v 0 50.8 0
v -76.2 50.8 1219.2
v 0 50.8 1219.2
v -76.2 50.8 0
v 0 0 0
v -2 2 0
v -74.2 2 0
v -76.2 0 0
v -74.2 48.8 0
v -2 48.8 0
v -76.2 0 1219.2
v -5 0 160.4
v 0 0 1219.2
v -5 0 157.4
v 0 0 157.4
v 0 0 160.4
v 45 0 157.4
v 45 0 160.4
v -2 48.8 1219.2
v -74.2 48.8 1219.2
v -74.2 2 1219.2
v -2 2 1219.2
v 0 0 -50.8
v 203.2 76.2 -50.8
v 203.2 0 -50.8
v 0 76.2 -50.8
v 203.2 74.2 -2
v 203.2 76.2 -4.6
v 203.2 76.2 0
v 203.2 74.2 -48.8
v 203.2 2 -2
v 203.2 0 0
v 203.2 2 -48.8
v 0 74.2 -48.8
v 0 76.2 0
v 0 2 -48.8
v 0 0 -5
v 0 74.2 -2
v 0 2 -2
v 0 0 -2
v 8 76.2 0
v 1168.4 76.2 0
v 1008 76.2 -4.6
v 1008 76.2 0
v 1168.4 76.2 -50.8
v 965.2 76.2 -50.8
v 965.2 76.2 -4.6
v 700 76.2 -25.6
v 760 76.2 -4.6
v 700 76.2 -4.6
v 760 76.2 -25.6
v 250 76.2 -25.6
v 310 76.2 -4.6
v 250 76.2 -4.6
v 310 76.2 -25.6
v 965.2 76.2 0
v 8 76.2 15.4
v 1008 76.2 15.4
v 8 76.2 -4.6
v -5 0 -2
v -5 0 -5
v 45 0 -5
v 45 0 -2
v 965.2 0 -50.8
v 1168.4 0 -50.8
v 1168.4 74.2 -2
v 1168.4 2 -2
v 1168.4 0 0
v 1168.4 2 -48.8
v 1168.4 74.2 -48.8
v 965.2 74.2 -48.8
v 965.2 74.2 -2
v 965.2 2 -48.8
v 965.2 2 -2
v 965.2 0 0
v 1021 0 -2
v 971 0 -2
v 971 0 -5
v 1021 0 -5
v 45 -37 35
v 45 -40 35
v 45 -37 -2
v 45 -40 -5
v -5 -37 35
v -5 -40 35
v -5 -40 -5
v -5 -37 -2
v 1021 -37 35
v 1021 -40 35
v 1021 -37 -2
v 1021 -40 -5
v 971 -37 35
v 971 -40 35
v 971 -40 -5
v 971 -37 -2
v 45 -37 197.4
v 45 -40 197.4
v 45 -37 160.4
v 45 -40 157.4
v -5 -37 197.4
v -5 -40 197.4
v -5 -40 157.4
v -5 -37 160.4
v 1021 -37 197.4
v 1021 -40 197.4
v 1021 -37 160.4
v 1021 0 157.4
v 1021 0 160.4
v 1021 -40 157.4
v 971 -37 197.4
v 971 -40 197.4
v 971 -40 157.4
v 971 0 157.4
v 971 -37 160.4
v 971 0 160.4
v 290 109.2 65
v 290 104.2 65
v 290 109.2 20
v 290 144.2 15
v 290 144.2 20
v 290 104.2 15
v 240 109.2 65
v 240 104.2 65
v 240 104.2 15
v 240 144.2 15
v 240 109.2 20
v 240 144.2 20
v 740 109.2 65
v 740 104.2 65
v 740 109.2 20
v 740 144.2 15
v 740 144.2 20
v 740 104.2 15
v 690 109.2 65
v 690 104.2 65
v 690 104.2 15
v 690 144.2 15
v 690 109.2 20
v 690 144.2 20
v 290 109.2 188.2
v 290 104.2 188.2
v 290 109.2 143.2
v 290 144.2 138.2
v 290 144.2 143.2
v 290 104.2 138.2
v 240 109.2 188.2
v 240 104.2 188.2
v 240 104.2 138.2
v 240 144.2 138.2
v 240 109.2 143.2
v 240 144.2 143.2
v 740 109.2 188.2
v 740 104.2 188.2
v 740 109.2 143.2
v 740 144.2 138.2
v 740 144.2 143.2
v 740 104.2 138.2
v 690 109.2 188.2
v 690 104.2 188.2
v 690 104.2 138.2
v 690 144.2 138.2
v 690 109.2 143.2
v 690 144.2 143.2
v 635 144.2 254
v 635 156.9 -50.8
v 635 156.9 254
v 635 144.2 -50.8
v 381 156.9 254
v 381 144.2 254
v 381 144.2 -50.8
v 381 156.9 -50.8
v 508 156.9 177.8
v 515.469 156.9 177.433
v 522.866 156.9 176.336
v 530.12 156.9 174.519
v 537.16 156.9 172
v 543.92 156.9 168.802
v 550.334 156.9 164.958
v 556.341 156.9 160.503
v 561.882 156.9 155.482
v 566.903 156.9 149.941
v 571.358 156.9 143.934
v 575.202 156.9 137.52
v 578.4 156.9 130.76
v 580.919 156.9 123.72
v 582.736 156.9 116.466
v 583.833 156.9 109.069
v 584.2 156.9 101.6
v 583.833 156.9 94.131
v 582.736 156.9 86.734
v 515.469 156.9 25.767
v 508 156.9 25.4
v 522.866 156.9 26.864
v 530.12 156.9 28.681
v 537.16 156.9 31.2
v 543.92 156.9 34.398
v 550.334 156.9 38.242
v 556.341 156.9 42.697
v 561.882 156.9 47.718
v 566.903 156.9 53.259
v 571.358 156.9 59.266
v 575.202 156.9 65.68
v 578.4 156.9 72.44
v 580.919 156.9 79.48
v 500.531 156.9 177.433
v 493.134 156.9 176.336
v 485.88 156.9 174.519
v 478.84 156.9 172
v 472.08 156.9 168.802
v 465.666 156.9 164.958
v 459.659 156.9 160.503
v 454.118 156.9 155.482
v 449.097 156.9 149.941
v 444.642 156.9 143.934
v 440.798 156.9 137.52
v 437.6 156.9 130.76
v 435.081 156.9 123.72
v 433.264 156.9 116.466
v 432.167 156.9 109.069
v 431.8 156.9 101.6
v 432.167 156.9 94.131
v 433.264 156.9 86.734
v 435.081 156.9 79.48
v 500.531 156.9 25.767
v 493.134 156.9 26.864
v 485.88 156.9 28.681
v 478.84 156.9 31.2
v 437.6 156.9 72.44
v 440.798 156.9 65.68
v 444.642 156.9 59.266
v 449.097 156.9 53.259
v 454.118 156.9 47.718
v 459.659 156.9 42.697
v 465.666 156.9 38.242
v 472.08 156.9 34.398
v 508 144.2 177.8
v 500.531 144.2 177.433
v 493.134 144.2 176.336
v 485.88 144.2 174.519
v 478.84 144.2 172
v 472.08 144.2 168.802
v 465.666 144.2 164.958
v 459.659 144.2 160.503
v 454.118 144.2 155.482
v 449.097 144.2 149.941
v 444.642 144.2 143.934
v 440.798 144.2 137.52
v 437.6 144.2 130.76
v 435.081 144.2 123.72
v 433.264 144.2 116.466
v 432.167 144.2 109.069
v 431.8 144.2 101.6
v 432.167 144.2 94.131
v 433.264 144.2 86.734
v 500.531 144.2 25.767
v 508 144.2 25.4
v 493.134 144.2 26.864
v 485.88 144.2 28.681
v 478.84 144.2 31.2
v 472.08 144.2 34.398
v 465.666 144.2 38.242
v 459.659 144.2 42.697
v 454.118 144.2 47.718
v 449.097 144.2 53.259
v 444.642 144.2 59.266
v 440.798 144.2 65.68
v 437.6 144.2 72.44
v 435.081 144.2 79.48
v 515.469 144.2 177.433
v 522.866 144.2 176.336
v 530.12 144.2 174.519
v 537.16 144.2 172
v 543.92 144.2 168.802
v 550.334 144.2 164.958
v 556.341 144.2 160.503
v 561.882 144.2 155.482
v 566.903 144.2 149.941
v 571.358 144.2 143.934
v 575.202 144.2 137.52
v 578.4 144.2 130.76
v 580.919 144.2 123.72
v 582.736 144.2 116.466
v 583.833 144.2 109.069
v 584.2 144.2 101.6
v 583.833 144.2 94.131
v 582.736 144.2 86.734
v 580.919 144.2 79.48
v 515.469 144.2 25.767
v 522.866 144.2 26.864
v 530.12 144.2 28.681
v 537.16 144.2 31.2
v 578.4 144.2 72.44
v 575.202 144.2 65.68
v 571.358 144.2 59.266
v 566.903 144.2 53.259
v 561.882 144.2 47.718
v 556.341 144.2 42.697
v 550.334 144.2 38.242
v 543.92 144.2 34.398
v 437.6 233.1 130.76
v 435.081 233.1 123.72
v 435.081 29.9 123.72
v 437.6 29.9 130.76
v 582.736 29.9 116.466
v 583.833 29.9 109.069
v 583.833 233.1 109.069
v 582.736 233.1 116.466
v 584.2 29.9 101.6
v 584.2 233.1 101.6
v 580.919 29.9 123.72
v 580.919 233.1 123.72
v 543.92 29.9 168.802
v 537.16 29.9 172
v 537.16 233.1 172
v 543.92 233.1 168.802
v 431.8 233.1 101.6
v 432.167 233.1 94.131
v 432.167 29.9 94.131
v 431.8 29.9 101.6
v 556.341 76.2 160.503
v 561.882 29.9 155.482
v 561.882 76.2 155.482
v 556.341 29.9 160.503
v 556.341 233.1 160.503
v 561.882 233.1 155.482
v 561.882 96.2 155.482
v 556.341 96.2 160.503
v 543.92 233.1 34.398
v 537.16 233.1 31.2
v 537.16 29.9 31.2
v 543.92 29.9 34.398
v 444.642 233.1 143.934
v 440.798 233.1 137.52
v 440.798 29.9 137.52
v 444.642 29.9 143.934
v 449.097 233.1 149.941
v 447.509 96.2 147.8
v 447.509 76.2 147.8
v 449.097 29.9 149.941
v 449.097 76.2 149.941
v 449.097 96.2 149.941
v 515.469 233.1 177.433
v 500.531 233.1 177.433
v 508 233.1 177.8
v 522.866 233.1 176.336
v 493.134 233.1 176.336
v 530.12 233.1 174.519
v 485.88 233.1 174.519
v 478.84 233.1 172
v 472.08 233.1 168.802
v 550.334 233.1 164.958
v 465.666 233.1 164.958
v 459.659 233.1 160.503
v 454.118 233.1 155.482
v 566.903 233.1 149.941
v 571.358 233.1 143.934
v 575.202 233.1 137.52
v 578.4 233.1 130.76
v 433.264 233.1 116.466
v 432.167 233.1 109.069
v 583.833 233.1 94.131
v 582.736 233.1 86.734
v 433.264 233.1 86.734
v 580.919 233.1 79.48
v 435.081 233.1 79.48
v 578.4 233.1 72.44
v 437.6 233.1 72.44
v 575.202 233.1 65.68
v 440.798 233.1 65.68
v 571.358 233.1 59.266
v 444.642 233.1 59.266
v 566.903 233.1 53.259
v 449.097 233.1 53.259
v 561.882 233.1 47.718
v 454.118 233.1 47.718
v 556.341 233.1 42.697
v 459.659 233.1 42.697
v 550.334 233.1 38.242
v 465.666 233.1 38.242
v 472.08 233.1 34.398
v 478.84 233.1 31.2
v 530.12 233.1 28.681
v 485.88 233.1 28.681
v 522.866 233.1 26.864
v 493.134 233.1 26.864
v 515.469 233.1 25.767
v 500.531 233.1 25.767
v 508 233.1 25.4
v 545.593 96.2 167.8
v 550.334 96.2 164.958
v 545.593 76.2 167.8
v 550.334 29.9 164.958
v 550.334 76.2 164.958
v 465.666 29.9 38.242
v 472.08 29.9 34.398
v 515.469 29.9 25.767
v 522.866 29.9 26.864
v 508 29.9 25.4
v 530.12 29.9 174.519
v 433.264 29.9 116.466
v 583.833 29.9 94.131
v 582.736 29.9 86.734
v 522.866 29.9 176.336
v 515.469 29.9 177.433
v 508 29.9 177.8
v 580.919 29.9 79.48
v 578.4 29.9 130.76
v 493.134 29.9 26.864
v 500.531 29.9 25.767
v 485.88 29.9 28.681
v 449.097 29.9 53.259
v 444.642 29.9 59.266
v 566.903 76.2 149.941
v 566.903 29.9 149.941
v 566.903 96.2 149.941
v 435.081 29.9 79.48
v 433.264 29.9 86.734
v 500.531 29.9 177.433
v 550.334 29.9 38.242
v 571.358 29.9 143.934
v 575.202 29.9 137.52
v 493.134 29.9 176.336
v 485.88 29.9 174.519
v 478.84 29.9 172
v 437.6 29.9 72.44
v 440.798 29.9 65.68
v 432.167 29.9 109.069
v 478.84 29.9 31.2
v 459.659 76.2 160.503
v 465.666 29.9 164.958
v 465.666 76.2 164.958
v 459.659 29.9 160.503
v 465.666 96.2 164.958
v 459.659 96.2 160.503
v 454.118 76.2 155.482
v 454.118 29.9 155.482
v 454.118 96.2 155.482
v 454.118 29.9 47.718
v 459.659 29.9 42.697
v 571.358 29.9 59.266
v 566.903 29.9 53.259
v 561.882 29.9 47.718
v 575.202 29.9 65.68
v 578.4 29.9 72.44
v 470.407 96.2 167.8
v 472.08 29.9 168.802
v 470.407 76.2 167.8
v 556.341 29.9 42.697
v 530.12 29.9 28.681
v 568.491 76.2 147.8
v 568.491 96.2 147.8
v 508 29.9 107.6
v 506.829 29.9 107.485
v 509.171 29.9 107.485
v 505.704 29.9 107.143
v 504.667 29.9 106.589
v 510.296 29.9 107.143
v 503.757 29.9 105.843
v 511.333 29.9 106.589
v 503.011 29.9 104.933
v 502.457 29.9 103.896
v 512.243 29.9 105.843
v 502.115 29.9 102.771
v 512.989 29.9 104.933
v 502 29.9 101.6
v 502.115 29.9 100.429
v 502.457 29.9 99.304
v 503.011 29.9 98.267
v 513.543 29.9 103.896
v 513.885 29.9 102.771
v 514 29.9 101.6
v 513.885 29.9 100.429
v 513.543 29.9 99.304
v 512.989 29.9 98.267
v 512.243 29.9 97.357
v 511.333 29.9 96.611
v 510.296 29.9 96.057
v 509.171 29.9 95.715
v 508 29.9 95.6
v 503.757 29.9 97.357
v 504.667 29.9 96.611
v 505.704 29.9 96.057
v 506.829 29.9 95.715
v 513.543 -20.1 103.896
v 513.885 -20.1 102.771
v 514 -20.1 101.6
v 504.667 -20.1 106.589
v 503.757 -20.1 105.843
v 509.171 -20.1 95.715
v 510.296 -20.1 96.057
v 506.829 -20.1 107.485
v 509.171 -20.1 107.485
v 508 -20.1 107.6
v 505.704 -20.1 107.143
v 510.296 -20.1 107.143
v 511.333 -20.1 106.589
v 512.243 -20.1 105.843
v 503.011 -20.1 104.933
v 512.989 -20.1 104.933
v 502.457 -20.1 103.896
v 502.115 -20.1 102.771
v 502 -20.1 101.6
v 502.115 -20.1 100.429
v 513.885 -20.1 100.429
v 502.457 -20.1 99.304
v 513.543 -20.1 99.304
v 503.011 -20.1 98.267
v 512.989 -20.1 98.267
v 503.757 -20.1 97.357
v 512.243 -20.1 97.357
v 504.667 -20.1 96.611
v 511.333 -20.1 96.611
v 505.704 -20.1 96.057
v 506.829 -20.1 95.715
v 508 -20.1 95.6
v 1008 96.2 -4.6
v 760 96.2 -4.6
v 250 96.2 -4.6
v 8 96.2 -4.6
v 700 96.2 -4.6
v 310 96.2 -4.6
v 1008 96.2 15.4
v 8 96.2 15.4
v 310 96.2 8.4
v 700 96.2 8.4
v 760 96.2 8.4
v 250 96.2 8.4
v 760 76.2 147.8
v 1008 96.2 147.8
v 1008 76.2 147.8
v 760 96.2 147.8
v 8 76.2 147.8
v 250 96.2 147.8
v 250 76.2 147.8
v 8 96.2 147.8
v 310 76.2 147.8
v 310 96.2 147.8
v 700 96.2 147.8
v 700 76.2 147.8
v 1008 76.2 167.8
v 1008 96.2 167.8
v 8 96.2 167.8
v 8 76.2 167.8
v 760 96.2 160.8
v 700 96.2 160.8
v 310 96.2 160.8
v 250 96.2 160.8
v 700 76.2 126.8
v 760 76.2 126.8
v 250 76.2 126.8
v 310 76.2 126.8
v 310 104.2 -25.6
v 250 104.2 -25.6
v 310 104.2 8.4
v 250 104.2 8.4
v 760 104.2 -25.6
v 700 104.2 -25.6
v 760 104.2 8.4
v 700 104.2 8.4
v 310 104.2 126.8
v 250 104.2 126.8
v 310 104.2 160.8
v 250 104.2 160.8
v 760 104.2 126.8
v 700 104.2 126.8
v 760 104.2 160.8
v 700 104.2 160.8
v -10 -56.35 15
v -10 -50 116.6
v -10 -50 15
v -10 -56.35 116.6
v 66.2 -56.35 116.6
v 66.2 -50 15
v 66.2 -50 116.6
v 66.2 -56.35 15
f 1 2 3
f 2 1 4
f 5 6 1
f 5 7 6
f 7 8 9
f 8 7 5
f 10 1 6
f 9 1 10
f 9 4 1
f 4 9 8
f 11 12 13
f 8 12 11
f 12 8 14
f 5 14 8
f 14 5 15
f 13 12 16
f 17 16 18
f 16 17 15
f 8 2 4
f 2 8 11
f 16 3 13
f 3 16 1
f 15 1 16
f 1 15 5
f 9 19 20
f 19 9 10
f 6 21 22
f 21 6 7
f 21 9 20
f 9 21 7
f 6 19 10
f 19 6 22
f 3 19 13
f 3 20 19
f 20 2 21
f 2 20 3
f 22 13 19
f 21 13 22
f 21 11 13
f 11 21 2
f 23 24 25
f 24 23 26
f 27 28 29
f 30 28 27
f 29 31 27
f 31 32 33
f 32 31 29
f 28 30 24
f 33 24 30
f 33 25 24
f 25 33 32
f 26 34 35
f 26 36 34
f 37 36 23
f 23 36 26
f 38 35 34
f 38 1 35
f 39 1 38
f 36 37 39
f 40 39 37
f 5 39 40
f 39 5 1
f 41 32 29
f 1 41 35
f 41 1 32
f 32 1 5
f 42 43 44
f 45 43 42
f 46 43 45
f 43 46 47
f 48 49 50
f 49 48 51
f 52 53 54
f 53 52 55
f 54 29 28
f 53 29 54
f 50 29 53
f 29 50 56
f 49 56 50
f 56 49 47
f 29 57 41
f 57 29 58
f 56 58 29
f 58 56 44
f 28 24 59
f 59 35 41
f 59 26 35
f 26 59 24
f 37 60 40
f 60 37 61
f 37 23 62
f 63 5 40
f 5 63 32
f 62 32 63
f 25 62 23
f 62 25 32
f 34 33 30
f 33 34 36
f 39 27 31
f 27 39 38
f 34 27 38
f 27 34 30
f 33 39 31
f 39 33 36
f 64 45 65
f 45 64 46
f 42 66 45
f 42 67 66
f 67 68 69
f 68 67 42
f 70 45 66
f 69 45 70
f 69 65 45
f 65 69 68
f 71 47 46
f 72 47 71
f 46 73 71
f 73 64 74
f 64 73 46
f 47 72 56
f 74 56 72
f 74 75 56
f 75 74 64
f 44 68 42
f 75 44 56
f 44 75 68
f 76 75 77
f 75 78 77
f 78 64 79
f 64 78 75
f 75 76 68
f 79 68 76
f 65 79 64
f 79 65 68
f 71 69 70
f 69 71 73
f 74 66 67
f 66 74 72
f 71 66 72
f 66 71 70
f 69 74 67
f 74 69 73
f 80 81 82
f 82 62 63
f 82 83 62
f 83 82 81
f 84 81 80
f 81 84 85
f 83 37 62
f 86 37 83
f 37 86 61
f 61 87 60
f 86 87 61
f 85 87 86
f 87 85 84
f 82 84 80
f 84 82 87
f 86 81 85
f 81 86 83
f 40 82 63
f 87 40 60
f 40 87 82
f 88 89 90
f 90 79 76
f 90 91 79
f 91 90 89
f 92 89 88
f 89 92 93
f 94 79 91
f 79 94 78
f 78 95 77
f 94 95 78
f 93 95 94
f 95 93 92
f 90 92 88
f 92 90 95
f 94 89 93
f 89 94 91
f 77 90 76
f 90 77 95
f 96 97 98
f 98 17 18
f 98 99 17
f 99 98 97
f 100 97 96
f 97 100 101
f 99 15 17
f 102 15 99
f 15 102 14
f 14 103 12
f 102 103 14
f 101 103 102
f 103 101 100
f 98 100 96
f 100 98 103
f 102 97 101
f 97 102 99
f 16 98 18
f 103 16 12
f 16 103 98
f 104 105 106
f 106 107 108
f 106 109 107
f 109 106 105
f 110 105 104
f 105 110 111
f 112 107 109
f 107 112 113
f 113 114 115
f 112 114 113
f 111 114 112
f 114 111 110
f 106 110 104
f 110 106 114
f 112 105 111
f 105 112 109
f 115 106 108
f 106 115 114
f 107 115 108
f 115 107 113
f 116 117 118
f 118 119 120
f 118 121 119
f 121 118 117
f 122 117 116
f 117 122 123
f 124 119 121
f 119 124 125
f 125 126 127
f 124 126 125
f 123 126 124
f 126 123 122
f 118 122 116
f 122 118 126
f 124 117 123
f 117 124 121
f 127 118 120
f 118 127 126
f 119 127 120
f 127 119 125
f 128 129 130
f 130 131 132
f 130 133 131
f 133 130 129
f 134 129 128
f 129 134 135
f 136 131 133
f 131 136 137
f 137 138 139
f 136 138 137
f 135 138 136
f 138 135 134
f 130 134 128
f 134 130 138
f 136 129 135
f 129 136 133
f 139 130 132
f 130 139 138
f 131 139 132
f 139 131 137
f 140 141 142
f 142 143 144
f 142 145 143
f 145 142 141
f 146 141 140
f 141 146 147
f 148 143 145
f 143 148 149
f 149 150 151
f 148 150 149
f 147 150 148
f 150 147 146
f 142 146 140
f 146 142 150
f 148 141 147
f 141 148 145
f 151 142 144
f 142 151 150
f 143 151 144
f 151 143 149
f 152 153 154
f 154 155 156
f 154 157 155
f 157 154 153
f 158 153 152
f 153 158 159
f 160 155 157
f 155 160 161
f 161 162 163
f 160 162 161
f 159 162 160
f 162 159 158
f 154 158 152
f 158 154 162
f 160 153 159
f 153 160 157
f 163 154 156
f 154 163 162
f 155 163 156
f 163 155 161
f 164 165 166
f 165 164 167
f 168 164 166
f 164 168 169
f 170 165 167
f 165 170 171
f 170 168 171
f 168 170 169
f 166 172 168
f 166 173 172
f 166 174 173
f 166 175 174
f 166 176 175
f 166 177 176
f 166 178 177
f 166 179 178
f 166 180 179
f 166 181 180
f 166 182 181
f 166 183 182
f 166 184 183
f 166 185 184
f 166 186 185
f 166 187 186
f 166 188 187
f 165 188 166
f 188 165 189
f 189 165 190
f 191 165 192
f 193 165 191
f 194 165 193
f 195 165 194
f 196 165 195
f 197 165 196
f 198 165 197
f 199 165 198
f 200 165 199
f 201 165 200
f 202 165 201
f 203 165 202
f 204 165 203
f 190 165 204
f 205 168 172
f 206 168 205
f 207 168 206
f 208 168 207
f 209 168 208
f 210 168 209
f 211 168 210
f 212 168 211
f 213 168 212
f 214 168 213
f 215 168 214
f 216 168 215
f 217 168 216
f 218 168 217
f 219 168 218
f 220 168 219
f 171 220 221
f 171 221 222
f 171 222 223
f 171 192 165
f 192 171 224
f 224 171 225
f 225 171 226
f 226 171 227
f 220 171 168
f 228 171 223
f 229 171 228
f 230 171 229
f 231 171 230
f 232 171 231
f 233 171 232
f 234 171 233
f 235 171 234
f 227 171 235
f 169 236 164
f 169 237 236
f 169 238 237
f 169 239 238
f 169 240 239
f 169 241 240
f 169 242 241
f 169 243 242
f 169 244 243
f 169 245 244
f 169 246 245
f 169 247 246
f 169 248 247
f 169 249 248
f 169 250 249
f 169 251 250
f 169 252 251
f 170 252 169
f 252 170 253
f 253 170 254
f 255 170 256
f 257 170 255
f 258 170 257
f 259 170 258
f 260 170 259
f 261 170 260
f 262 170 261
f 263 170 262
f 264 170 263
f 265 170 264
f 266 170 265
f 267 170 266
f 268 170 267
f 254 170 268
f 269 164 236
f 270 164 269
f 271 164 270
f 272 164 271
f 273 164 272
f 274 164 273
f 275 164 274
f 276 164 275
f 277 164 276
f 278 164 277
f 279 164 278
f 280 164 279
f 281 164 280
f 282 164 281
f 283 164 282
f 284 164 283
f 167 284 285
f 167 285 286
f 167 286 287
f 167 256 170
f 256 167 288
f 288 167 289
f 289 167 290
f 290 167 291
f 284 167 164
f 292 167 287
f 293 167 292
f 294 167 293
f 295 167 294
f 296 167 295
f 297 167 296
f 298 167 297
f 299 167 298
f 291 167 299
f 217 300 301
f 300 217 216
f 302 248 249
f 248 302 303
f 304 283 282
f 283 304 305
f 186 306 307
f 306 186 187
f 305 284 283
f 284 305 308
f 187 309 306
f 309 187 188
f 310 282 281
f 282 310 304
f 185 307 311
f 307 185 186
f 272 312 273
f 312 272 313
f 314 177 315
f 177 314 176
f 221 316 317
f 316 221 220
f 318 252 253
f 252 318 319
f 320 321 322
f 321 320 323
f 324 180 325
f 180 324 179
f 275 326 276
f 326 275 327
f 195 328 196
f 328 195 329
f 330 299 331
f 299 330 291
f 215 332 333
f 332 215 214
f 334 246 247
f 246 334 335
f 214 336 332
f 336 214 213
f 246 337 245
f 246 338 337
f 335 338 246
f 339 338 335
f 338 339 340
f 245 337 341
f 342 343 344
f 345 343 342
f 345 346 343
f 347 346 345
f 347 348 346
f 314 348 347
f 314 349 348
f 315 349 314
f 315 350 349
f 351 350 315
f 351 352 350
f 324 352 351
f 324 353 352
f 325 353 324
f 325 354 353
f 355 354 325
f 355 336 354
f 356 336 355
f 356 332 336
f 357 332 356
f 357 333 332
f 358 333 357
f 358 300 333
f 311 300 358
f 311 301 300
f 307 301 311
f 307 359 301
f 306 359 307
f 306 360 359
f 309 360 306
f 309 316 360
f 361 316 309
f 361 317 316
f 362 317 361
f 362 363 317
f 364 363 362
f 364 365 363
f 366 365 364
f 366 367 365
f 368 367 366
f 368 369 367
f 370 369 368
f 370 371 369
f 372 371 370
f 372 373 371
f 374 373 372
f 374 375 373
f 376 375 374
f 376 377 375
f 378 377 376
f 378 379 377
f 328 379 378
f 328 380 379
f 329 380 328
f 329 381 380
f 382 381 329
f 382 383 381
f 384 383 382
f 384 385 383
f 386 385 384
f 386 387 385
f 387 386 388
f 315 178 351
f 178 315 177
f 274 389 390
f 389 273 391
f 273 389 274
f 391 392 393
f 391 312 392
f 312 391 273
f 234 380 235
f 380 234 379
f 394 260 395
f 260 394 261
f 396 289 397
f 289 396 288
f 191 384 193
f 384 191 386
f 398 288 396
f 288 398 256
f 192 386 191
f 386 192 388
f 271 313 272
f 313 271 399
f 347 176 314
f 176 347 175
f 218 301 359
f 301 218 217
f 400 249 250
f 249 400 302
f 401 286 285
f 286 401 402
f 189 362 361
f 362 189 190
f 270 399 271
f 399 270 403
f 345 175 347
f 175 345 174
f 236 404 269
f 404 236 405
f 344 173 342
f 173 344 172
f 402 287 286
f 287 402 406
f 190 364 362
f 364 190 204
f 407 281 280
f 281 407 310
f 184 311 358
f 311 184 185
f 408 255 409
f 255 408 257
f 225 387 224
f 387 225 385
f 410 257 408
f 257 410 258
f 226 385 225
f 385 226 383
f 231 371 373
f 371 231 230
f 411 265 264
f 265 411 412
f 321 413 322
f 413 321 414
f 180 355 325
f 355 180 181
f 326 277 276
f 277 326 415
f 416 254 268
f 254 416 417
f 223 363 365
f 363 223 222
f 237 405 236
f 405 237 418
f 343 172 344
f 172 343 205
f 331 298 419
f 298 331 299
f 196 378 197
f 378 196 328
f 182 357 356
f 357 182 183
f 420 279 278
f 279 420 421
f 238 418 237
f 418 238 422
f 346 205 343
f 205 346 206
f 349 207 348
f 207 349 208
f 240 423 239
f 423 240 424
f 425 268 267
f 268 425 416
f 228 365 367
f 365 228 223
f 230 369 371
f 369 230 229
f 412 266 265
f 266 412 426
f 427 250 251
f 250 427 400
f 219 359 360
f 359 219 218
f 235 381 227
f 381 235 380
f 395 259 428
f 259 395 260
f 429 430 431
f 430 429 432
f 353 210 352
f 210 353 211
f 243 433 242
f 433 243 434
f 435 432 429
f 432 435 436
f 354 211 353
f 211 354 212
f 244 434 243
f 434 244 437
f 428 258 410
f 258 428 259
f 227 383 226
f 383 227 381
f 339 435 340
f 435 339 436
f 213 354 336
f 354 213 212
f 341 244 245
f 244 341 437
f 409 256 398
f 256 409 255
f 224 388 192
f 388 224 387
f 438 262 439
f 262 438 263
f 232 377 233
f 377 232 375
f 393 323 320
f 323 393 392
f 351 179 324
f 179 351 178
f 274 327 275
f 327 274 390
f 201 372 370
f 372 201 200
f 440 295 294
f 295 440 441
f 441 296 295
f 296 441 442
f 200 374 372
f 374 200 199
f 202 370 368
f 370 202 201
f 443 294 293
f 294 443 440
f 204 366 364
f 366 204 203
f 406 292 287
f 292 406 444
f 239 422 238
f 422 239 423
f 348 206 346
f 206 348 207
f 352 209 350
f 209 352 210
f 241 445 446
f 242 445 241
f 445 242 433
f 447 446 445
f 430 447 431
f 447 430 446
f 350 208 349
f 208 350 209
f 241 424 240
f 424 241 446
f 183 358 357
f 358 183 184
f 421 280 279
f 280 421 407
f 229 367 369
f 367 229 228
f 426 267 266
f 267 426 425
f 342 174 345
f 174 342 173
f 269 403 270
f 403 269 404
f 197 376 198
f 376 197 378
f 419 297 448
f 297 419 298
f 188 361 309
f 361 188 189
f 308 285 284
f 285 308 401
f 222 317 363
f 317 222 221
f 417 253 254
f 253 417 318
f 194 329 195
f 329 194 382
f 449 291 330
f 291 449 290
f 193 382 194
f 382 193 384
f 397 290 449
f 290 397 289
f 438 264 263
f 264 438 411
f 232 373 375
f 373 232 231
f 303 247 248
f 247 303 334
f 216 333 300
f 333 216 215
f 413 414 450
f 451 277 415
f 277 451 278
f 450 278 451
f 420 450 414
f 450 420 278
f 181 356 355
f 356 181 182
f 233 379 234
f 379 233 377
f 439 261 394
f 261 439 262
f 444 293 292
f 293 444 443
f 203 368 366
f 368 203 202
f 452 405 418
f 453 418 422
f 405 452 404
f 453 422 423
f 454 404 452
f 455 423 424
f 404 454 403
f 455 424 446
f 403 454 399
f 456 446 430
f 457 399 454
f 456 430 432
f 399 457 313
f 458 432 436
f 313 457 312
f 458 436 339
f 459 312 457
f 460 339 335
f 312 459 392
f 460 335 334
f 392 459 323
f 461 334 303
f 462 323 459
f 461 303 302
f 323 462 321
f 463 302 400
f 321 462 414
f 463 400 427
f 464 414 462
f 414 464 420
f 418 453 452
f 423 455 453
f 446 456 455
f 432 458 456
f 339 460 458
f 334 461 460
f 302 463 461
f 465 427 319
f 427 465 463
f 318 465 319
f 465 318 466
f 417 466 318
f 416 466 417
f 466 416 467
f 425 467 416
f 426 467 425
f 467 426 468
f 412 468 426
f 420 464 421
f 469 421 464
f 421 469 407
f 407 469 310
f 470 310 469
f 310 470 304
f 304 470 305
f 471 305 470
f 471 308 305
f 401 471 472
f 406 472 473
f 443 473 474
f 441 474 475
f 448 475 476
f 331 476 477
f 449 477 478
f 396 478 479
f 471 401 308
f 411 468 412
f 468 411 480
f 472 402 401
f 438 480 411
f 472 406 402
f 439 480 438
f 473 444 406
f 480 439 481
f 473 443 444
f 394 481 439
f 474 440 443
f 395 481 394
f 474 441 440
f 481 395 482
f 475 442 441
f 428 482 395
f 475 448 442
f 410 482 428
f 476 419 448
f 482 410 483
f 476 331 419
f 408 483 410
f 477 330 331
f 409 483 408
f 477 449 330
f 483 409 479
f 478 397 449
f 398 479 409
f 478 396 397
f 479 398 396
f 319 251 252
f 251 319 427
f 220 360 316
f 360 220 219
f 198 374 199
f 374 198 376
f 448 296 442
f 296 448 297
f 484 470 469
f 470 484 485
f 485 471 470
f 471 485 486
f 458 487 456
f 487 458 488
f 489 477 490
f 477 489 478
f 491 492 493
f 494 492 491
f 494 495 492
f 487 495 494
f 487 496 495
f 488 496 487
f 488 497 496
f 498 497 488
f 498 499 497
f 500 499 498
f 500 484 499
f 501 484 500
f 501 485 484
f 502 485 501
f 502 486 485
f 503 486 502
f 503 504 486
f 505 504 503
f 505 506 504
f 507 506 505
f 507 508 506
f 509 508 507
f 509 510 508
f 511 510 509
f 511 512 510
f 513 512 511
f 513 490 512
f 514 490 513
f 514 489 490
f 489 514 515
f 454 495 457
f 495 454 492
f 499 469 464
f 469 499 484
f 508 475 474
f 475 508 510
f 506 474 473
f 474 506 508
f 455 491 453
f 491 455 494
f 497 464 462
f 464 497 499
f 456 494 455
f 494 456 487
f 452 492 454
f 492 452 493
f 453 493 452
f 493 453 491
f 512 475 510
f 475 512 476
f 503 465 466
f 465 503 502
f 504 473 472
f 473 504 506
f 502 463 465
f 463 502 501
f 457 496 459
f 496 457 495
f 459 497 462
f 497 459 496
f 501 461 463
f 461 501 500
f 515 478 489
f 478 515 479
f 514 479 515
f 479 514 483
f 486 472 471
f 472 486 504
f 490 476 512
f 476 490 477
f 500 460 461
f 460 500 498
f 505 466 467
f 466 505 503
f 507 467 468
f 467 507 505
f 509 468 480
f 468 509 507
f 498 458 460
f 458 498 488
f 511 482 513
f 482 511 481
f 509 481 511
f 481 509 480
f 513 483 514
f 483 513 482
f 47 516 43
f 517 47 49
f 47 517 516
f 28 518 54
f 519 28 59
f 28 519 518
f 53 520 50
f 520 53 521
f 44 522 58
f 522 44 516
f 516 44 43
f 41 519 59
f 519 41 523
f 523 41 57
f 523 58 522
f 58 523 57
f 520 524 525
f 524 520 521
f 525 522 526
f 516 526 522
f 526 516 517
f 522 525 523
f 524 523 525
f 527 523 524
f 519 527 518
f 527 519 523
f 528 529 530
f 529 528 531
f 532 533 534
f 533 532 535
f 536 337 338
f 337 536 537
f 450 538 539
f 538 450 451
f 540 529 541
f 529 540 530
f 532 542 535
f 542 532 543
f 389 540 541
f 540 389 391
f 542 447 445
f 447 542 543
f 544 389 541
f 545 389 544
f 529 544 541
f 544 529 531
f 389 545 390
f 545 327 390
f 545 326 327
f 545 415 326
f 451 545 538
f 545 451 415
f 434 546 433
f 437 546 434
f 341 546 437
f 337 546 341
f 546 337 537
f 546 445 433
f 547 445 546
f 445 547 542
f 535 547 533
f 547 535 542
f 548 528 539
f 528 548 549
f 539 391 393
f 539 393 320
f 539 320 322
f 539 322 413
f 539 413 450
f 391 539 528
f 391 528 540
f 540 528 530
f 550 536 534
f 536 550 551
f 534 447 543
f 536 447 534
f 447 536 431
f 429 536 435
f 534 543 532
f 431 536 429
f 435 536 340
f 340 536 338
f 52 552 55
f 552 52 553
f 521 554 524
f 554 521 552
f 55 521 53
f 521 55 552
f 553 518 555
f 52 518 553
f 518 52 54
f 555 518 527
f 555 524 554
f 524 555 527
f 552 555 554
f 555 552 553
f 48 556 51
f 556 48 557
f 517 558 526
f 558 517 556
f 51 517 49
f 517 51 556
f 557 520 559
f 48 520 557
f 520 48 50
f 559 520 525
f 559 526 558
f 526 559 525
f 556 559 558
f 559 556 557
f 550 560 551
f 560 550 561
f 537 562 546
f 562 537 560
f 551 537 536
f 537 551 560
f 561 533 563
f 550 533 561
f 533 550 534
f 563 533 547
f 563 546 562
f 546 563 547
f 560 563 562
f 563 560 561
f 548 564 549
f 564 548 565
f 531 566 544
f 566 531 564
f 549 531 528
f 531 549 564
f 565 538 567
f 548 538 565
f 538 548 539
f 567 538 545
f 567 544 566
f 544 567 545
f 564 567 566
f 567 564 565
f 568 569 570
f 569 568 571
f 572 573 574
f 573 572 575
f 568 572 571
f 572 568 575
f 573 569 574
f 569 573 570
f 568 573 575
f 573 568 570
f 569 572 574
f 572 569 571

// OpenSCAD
// X-Gantry Assembly for Router Sled
// 40" x 8" box frame with 2x3 steel tubes, cross-braces, and X-rails

// All dimensions in millimeters

// Steel tube dimensions
tube_length = 40 * 25.4;  // 1016mm
tube_width = 2 * 25.4;    // 50.8mm
tube_height = 3 * 25.4;   // 76.2mm
tube_wall = 2;            // 14 gauge ≈ 2mm

// Cross-brace dimensions
cross_brace_length = 8 * 25.4;  // 203.2mm

// Rail dimensions
rail_width = 20;  // SBR20
rail_height = 20;
rail_length = 1000;  // 1000mm rails

// Router plate dimensions
plate_width = 10 * 25.4;   // 254mm
plate_length = 12 * 25.4;  // 304.8mm
plate_thickness = 0.5 * 25.4;  // 12.7mm (1/2")

// Router dimensions (approximate Bosch 1617EVS)
router_diameter = 6 * 25.4;  // 152.4mm
router_height = 8 * 25.4;    // 203.2mm

// Colors
steel_color = [0.6, 0.6, 0.7];
rail_color = [0.3, 0.3, 0.3];
plate_color = [0.9, 0.9, 0.95, 0.7];  // Translucent acrylic
router_color = [0.2, 0.3, 0.4];

module steel_tube(length) {
    color(steel_color)
    difference() {
        // Outer tube
        cube([tube_width, tube_height, length]);
        // Inner hollow
        translate([tube_wall, tube_wall, -1])
        cube([tube_width - 2*tube_wall, tube_height - 2*tube_wall, length + 2]);
    }
}

module t_plate() {
    // Simplified T-plate (3" x 4" x 1/4")
    plate_width = 3 * 25.4;   // 76.2mm
    plate_length = 4 * 25.4;   // 101.6mm
    plate_thickness = 0.25 * 25.4;  // 6.35mm

    color([0.5, 0.5, 0.55])
    // Simplified as flat plate (actual T-shape would be more complex)
    cube([plate_width, plate_length, plate_thickness]);
}

module l_bracket() {
    bracket_thickness = 3;
    bracket_width = 50;
    bracket_length1 = 40;
    bracket_length2 = 40;

    color([0.3, 0.3, 0.35])
    union() {
        cube([bracket_width, bracket_thickness, bracket_length1]);
        cube([bracket_width, bracket_length2, bracket_thickness]);
    }
}

module x_rail() {
    color(rail_color)
    cube([rail_width, rail_height, rail_length]);
}

module x_rail_slide_block() {
    // SBR20UU slide block
    block_length = 60;
    block_width = 34;
    block_height = 28;

    color([0.2, 0.2, 0.25])
    cube([block_width, block_height, block_length]);
}

module z_bracket() {
    // Simplified Z-bracket
    bracket_thickness = 5;
    bracket_height = 40;
    bracket_width = 50;

    color([0.35, 0.35, 0.4])
    union() {
        // Horizontal base
        cube([bracket_width, bracket_thickness, bracket_width]);
        // Vertical leg
        cube([bracket_width, bracket_height, bracket_thickness]);
    }
}

module router_plate() {
    color(plate_color)
    difference() {
        // Plate
        cube([plate_width, plate_thickness, plate_length]);
        // Router mounting hole (simplified)
        translate([plate_width/2, -1, plate_length/2])
        cylinder(h=plate_thickness+2, d=4*25.4, $fn=64);
    }
}

module router() {
    color(router_color)
    union() {
        // Router body (cylinder)
        rotate([90, 0, 0])
        cylinder(h=router_height, d=router_diameter, $fn=64);

        // Router bit (simplified)
        translate([0, -router_height, 0])
        rotate([90, 0, 0])
        cylinder(h=50, d=12, $fn=32);
    }
}

// Complete X-Gantry Assembly
module x_gantry_assembly() {
    // First 40" tube (front)
    translate([0, 0, 0])
    rotate([0, 0, 90])
    steel_tube(tube_length);

    // Second 40" tube (back, spaced 8" apart)
    translate([0, 0, cross_brace_length])
    rotate([0, 0, 90])
    steel_tube(tube_length);

    // Left cross-brace (8")
    translate([0, 0, 0])
    rotate([0, 90, 0])
    steel_tube(cross_brace_length);

    // Right cross-brace (8")
    translate([tube_length - tube_width, 0, 0])
    rotate([0, 90, 0])
    steel_tube(cross_brace_length);

    // L-brackets at corners (4 total, bottom face)
    // Front left
    translate([-5, -40, -5])
    rotate([0, 0, 0])
    l_bracket();

    // Front right
    translate([tube_length - 45, -40, -5])
    rotate([0, 0, 0])
    l_bracket();

    // Rear left
    translate([-5, -40, cross_brace_length - tube_width + 5])
    rotate([0, 0, 0])
    l_bracket();

    // Rear right
    translate([tube_length - 45, -40, cross_brace_length - tube_width + 5])
    rotate([0, 0, 0])
    l_bracket();

    // X-rails (1000mm, mounted on top of tubes)
    // Front rail
    translate([tube_length/2 - rail_length/2, tube_height, tube_width/2 - rail_width/2])
    rotate([0, 90, 0])
    x_rail();

    // Rear rail
    translate([tube_length/2 - rail_length/2, tube_height, cross_brace_length - tube_width/2 - rail_width/2])
    rotate([0, 90, 0])
    x_rail();

    // X-rail slide blocks (4 total, 2 per rail)
    // Front rail blocks
    translate([250, tube_height, tube_width/2 - 17])
    rotate([0, 90, 0])
    x_rail_slide_block();

    translate([700, tube_height, tube_width/2 - 17])
    rotate([0, 90, 0])
    x_rail_slide_block();

    // Rear rail blocks
    translate([250, tube_height, cross_brace_length - tube_width/2 - 17])
    rotate([0, 90, 0])
    x_rail_slide_block();

    translate([700, tube_height, cross_brace_length - tube_width/2 - 17])
    rotate([0, 90, 0])
    x_rail_slide_block();

    // Z-brackets (4 total, attached to slide blocks)
    // Front left
    translate([240, tube_height + 28, 15])
    z_bracket();

    // Front right
    translate([690, tube_height + 28, 15])
    z_bracket();

    // Rear left
    translate([240, tube_height + 28, cross_brace_length - 65])
    z_bracket();

    // Rear right
    translate([690, tube_height + 28, cross_brace_length - 65])
    z_bracket();

    // Router plate (mounted on Z-brackets)
    translate([tube_length/2 - plate_width/2, tube_height + 68, cross_brace_length/2 - plate_length/2])
    router_plate();

    // Router (mounted on plate)
    translate([tube_length/2, tube_height + 68 + plate_thickness + router_diameter/2, cross_brace_length/2])
    router();

    // T-plates at corners (shown for reference, simplified position)
    // These would be at Y-rail slide block interface in full assembly
    // Shown here slightly offset for visibility
    translate([-10, -50, 15])
    rotate([90, 0, 0])
    t_plate();
}

// Render the assembly
x_gantry_assembly();

// Add reference annotations (as comments for documentation)
// Frame dimensions: 40" (1016mm) x 8" (203mm) box
// Internal dimensions: 36" x 8" (914mm x 203mm)
// Rail spacing: 8" (203mm) center-to-center
// Rail travel: 39.4" (1000mm)
// Router plate: 10" x 12" x 1/2" (254mm x 305mm x 12.7mm)
// Height adjustment: 3" (76mm) via T-plate repositioning
